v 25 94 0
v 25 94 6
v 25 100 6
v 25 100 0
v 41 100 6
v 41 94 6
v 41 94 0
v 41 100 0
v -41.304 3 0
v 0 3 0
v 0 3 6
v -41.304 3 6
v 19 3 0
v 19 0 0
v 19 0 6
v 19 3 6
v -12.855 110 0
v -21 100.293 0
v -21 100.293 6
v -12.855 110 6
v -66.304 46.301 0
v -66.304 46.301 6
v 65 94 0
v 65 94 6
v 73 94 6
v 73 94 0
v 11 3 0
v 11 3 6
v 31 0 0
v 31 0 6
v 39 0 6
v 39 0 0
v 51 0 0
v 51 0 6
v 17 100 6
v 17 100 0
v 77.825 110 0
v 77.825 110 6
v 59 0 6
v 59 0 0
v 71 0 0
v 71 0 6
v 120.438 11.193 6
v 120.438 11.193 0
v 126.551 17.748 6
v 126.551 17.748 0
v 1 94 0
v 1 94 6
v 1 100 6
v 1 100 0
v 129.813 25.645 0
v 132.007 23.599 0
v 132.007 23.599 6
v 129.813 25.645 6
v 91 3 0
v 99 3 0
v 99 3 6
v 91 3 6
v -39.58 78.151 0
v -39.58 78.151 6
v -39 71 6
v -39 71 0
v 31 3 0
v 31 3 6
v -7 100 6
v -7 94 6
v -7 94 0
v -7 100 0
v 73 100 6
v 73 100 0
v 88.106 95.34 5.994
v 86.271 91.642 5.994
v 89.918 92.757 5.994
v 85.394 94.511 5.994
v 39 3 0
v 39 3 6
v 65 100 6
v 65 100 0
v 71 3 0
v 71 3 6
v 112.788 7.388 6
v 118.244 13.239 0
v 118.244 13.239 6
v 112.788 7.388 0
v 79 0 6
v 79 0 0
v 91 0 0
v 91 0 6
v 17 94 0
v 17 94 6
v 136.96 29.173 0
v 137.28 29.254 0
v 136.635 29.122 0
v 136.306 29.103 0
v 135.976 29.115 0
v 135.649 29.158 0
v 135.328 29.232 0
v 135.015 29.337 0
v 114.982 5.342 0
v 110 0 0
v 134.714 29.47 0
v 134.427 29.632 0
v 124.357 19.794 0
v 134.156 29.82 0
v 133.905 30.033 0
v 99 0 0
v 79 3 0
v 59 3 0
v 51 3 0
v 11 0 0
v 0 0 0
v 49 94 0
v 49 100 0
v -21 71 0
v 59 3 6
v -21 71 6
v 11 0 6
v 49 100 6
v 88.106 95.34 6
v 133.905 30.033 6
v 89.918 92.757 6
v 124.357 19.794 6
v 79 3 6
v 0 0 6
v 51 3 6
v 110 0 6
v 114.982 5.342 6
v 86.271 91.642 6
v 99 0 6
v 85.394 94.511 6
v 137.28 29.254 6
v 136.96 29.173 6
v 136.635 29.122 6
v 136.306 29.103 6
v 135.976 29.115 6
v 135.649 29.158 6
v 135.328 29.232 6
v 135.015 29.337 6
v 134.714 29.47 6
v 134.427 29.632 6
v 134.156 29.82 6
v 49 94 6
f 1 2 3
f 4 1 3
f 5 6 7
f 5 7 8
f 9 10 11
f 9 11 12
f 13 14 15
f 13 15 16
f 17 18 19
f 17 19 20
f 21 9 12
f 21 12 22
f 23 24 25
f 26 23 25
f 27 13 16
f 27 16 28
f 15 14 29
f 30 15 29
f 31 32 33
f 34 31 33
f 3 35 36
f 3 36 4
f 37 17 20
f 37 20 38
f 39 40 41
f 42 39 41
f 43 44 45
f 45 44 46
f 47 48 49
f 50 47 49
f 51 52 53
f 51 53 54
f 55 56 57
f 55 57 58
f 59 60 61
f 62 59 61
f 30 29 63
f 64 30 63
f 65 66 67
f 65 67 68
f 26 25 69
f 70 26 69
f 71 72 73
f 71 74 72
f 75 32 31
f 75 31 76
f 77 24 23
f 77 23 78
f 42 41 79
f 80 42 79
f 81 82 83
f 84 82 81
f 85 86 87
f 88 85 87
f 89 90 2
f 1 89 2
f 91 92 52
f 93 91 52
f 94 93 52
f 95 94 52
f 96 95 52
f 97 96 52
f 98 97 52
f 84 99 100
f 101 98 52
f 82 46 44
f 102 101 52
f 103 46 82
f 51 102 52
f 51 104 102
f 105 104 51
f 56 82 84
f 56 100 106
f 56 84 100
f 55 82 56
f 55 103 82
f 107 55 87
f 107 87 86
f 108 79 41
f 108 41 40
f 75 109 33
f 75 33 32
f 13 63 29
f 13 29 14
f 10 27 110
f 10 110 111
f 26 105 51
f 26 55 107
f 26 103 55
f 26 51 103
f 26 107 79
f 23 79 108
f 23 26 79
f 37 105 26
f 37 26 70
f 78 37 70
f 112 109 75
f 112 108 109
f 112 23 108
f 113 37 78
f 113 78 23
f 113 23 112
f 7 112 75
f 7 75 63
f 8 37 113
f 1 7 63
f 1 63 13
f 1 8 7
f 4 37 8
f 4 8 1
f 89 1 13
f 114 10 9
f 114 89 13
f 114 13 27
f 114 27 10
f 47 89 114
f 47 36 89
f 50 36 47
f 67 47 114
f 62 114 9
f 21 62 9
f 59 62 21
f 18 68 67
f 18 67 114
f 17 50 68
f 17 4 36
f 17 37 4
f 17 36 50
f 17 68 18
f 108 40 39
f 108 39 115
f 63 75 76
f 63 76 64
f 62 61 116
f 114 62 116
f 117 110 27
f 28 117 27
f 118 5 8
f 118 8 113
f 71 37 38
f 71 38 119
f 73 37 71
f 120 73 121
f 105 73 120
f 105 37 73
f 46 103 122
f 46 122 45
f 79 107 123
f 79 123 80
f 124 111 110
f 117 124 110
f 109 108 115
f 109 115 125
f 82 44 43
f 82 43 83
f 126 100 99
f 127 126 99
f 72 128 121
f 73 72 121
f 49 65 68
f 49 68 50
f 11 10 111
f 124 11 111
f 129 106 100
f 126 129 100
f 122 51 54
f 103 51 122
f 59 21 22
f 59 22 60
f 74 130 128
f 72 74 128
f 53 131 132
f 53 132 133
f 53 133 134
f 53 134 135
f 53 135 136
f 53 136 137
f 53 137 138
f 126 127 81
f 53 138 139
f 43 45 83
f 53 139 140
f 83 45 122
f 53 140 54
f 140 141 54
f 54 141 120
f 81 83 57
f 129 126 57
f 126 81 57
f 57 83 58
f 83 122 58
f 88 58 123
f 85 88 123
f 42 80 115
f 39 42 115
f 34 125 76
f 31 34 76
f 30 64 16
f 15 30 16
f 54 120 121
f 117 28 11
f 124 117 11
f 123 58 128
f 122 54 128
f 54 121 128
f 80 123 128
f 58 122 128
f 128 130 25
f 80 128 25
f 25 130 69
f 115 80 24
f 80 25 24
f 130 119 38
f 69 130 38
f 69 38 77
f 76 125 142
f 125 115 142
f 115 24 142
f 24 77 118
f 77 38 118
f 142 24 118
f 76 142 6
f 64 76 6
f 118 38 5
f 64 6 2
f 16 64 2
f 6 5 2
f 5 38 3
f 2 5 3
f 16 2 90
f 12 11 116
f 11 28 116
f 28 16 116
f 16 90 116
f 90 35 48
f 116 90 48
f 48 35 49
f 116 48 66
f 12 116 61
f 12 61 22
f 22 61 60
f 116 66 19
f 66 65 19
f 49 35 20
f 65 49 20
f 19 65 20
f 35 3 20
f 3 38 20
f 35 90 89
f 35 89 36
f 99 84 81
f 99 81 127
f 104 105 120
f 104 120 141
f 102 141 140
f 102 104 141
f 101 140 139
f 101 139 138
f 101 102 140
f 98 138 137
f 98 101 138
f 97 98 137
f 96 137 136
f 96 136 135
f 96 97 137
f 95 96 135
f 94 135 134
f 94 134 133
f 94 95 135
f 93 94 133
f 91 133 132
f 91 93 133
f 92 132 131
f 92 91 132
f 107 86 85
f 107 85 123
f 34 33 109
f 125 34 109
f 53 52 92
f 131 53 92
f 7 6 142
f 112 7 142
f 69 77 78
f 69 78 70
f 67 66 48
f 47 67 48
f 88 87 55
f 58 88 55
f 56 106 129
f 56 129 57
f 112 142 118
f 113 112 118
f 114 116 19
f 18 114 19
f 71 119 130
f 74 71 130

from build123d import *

# Parameters (mm, degrees)
BOSS_EXTRU_1_DEPTH      = 6
ESQUISSE3_W             = 8
ESQUISSE3_H             = 3
ENL_V_MAT_EXTRU_1_DEPTH = 6
BOSS_EXTRU_2_DEPTH      = 6
ENL_V_MAT_EXTRU_2_DEPTH = 6
ENL_V_MAT_EXTRU_3_DEPTH = 10
ESQUISSE9_W             = 8
ESQUISSE9_H             = 6
ENL_V_MAT_EXTRU_4_DEPTH = 6
ENL_V_MAT_EXTRU_5_DEPTH = 10
ENL_V_MAT_EXTRU_6_DEPTH = 0.006


with BuildPart() as part:
    # Esquisse1 → Boss.-Extru.1 (new body)
    with BuildSketch(Plane.XY):
        Polygon((0, 0), (110, 0), (137.279934402, 29.254148065), (105.119046883, 134.447671221), (102.250132615, 133.570556107), (133.904617487, 30.033401375), (108.695562875, 3), (0, 3), align=None)
    extrude(amount=BOSS_EXTRU_1_DEPTH)

    # Esquisse3 → Enlèv. mat.-Extru.1 (cut)
    with BuildSketch(Plane(origin=(0, 0, 0), x_dir=(-1, 0, 0), z_dir=(0, 0, -1))):
        with Locations((-15, 1.5)):
            Rectangle(ESQUISSE3_W, ESQUISSE3_H)
        with Locations((-35, 1.5)):
            Rectangle(ESQUISSE3_W, ESQUISSE3_H)
        with Locations((-55, 1.5)):
            Rectangle(ESQUISSE3_W, ESQUISSE3_H)
        with Locations((-75, 1.5)):
            Rectangle(ESQUISSE3_W, ESQUISSE3_H)
        with Locations((-95, 1.5)):
            Rectangle(ESQUISSE3_W, ESQUISSE3_H)
        Polygon((-112.787553035, 7.38812221), (-114.98161414, 5.34212713), (-120.437601021, 11.192956742), (-118.243539916, 13.238951823), align=None)
        Polygon((-124.356640446, 19.794449553), (-126.550701551, 17.748454473), (-132.006688432, 23.599284086), (-129.812627327, 25.645279166), align=None)
        Polygon((-107.805195005, 115.400765743), (-110.674109273, 116.277880857), (-108.335135635, 123.928318905), (-105.466221367, 123.051203791), align=None)
        Polygon((-112.981575907, 96.082249217), (-115.850490175, 96.959364332), (-113.511516537, 104.609802379), (-110.642602269, 103.732687265), align=None)
        Polygon((-118.157956809, 76.763732692), (-121.026871077, 77.640847806), (-118.687897439, 85.291285854), (-115.818983171, 84.414170739), align=None)
        Polygon((-123.334337711, 57.445216166), (-126.203251979, 58.32233128), (-123.864278341, 65.972769328), (-120.995364073, 65.095654214), align=None)
        Polygon((-128.510718613, 38.12669964), (-131.379632881, 39.003814754), (-129.040659243, 46.654252802), (-126.171744975, 45.777137688), align=None)
    extrude(amount=-ENL_V_MAT_EXTRU_1_DEPTH, mode=Mode.SUBTRACT)


with BuildPart() as enl_v_mat_extru_1_piece_1:
    # of the separate pieces the step leaves, piece 1, a body of its own (enl_v_mat_extru_1_pieces)
    add(part.part.solids().sort_by_distance((132.006688432, 23.599284086, 0))[0])



with BuildPart() as enl_v_mat_extru_1_piece_2:
    # of the separate pieces the step leaves, piece 2, a body of its own (enl_v_mat_extru_1_pieces)
    add(part.part.solids().sort_by_distance((99, 0, 0))[0])


with BuildPart() as enl_v_mat_extru_1_piece_3:
    # of the separate pieces the step leaves, piece 3, a body of its own (enl_v_mat_extru_1_pieces)
    add(part.part.solids().sort_by_distance((39, 0, 0))[0])


with BuildPart() as enl_v_mat_extru_1_piece_4:
    # of the separate pieces the step leaves, piece 4, a body of its own (enl_v_mat_extru_1_pieces)
    add(part.part.solids().sort_by_distance((19, 0, 0))[0])


with BuildPart() as enl_v_mat_extru_1_piece_5:
    # of the separate pieces the step leaves, piece 5, a body of its own (enl_v_mat_extru_1_pieces)
    add(part.part.solids().sort_by_distance((59, 0, 0))[0])


with BuildPart() as enl_v_mat_extru_1_piece_6:
    # of the separate pieces the step leaves, piece 6, a body of its own (enl_v_mat_extru_1_pieces)
    add(part.part.solids().sort_by_distance((79, 0, 0))[0])


with BuildPart() as enl_v_mat_extru_1_piece_7:
    # of the separate pieces the step leaves, piece 7, a body of its own (enl_v_mat_extru_1_pieces)
    add(part.part.solids().sort_by_distance((0, 0, 0))[0])


with BuildPart() as enl_v_mat_extru_1_piece_8:
    # of the separate pieces the step leaves, piece 8, a body of its own (enl_v_mat_extru_1_pieces)
    add(part.part.solids().sort_by_distance((108.335135635, 123.928318905, 0))[0])


with BuildPart() as enl_v_mat_extru_1_piece_9:
    # of the separate pieces the step leaves, piece 9, a body of its own (enl_v_mat_extru_1_pieces)
    add(part.part.solids().sort_by_distance((120.437601021, 11.192956742, 0))[0])


with BuildPart() as enl_v_mat_extru_1_piece_1_1:
    add(enl_v_mat_extru_1_piece_1.part)

    add(enl_v_mat_extru_1_piece_2.part)  # Boss.-Extru.2 merges Enlèv. mat.-Extru.1 piece 2

    add(enl_v_mat_extru_1_piece_3.part)  # Boss.-Extru.2 merges Enlèv. mat.-Extru.1 piece 3

    add(enl_v_mat_extru_1_piece_4.part)  # Boss.-Extru.2 merges Enlèv. mat.-Extru.1 piece 4

    add(enl_v_mat_extru_1_piece_5.part)  # Boss.-Extru.2 merges Enlèv. mat.-Extru.1 piece 5

    add(enl_v_mat_extru_1_piece_6.part)  # Boss.-Extru.2 merges Enlèv. mat.-Extru.1 piece 6

    add(enl_v_mat_extru_1_piece_7.part)  # Boss.-Extru.2 merges Enlèv. mat.-Extru.1 piece 7

    add(enl_v_mat_extru_1_piece_9.part)  # Boss.-Extru.2 merges Enlèv. mat.-Extru.1 piece 9
    # Esquisse4 → Boss.-Extru.2 (add)
    with BuildSketch(Plane(origin=(0, 0, 0), x_dir=(-1, 0, 0), z_dir=(0, 0, -1))):
        Polygon((-39, 3), (0, 3), (41.304437125, 3), (66.304437125, 46.301270189), (-36.541580425, 168.868381088), (-133.904617487, 30.033401375), (-108.695562875, 3), (-51, 3), align=None)
    extrude(amount=-BOSS_EXTRU_2_DEPTH)


with BuildPart() as enl_v_mat_extru_2_tool:
    # Esquisse7 → Enlèv. mat.-Extru.2 (new body)
    with BuildSketch(Plane(origin=(0, 0, 0), x_dir=(-1, 0, 0), z_dir=(0, 0, -1))):
        with BuildLine():
            Line((-137.279934402, 29.254148065), (-105.119046883, 134.447671221))
            Line((-105.119046883, 134.447671221), (-102.250132615, 133.570556107))
            Line((-102.250132615, 133.570556107), (-133.904617487, 30.033401375))
            ThreePointArc((-133.904617487, 30.033401375), (-135.487875797, 29.191567999), (-137.279934402, 29.254148065))
        make_face()
    extrude(amount=-ENL_V_MAT_EXTRU_2_DEPTH)


with BuildPart() as enl_v_mat_extru_1_piece_1_2:
    add(enl_v_mat_extru_1_piece_1_1.part)

    # Enlèv. mat.-Extru.2: cut by enl_v_mat_extru_2_tool
    add(enl_v_mat_extru_2_tool.part, mode=Mode.SUBTRACT)

    # Esquisse8 → Enlèv. mat.-Extru.3 (cut)
    with BuildSketch(Plane(origin=(0, 0, 0), x_dir=(-1, 0, 0), z_dir=(0, 0, -1))):
        Polygon((12.854856434, 110), (-77.825155944, 110), (-36.541580425, 168.868381088), align=None)
    extrude(amount=-ENL_V_MAT_EXTRU_3_DEPTH, mode=Mode.SUBTRACT)

    # Esquisse9 → Enlèv. mat.-Extru.4 (cut)
    with BuildSketch(Plane.XY.offset(6)):
        with Locations((69, 97)):
            Rectangle(ESQUISSE9_W, ESQUISSE9_H)
        with Locations((45, 97)):
            Rectangle(ESQUISSE9_W, ESQUISSE9_H)
        with Locations((21, 97)):
            Rectangle(ESQUISSE9_W, ESQUISSE9_H)
        with Locations((-3, 97)):
            Rectangle(ESQUISSE9_W, ESQUISSE9_H)
    extrude(amount=-ENL_V_MAT_EXTRU_4_DEPTH, mode=Mode.SUBTRACT)

    # Esquisse10 → Enlèv. mat.-Extru.5 (cut)
    with BuildSketch(Plane.XY.offset(6)):
        Polygon((-21, 71), (-21, 100.292995893), (-39.57964678, 78.150635095), (-39, 71), align=None)
    extrude(amount=-ENL_V_MAT_EXTRU_5_DEPTH, mode=Mode.SUBTRACT)

    # Esquisse11 → Enlèv. mat.-Extru.6 (cut)
    with BuildSketch(Plane.XY.offset(6)):
        Polygon((86.271198829, 91.64198356), (89.917576683, 92.756793146), (88.105999998, 95.340013841), (85.394083714, 94.510897828), align=None)
    extrude(amount=-ENL_V_MAT_EXTRU_6_DEPTH, mode=Mode.SUBTRACT)


with BuildPart() as enl_v_mat_extru_1_piece_8_1:
    add(enl_v_mat_extru_1_piece_8.part)

    # Enlèv. mat.-Extru.2: cut by enl_v_mat_extru_2_tool
    add(enl_v_mat_extru_2_tool.part, mode=Mode.SUBTRACT)


solid = enl_v_mat_extru_1_piece_1_2.part
